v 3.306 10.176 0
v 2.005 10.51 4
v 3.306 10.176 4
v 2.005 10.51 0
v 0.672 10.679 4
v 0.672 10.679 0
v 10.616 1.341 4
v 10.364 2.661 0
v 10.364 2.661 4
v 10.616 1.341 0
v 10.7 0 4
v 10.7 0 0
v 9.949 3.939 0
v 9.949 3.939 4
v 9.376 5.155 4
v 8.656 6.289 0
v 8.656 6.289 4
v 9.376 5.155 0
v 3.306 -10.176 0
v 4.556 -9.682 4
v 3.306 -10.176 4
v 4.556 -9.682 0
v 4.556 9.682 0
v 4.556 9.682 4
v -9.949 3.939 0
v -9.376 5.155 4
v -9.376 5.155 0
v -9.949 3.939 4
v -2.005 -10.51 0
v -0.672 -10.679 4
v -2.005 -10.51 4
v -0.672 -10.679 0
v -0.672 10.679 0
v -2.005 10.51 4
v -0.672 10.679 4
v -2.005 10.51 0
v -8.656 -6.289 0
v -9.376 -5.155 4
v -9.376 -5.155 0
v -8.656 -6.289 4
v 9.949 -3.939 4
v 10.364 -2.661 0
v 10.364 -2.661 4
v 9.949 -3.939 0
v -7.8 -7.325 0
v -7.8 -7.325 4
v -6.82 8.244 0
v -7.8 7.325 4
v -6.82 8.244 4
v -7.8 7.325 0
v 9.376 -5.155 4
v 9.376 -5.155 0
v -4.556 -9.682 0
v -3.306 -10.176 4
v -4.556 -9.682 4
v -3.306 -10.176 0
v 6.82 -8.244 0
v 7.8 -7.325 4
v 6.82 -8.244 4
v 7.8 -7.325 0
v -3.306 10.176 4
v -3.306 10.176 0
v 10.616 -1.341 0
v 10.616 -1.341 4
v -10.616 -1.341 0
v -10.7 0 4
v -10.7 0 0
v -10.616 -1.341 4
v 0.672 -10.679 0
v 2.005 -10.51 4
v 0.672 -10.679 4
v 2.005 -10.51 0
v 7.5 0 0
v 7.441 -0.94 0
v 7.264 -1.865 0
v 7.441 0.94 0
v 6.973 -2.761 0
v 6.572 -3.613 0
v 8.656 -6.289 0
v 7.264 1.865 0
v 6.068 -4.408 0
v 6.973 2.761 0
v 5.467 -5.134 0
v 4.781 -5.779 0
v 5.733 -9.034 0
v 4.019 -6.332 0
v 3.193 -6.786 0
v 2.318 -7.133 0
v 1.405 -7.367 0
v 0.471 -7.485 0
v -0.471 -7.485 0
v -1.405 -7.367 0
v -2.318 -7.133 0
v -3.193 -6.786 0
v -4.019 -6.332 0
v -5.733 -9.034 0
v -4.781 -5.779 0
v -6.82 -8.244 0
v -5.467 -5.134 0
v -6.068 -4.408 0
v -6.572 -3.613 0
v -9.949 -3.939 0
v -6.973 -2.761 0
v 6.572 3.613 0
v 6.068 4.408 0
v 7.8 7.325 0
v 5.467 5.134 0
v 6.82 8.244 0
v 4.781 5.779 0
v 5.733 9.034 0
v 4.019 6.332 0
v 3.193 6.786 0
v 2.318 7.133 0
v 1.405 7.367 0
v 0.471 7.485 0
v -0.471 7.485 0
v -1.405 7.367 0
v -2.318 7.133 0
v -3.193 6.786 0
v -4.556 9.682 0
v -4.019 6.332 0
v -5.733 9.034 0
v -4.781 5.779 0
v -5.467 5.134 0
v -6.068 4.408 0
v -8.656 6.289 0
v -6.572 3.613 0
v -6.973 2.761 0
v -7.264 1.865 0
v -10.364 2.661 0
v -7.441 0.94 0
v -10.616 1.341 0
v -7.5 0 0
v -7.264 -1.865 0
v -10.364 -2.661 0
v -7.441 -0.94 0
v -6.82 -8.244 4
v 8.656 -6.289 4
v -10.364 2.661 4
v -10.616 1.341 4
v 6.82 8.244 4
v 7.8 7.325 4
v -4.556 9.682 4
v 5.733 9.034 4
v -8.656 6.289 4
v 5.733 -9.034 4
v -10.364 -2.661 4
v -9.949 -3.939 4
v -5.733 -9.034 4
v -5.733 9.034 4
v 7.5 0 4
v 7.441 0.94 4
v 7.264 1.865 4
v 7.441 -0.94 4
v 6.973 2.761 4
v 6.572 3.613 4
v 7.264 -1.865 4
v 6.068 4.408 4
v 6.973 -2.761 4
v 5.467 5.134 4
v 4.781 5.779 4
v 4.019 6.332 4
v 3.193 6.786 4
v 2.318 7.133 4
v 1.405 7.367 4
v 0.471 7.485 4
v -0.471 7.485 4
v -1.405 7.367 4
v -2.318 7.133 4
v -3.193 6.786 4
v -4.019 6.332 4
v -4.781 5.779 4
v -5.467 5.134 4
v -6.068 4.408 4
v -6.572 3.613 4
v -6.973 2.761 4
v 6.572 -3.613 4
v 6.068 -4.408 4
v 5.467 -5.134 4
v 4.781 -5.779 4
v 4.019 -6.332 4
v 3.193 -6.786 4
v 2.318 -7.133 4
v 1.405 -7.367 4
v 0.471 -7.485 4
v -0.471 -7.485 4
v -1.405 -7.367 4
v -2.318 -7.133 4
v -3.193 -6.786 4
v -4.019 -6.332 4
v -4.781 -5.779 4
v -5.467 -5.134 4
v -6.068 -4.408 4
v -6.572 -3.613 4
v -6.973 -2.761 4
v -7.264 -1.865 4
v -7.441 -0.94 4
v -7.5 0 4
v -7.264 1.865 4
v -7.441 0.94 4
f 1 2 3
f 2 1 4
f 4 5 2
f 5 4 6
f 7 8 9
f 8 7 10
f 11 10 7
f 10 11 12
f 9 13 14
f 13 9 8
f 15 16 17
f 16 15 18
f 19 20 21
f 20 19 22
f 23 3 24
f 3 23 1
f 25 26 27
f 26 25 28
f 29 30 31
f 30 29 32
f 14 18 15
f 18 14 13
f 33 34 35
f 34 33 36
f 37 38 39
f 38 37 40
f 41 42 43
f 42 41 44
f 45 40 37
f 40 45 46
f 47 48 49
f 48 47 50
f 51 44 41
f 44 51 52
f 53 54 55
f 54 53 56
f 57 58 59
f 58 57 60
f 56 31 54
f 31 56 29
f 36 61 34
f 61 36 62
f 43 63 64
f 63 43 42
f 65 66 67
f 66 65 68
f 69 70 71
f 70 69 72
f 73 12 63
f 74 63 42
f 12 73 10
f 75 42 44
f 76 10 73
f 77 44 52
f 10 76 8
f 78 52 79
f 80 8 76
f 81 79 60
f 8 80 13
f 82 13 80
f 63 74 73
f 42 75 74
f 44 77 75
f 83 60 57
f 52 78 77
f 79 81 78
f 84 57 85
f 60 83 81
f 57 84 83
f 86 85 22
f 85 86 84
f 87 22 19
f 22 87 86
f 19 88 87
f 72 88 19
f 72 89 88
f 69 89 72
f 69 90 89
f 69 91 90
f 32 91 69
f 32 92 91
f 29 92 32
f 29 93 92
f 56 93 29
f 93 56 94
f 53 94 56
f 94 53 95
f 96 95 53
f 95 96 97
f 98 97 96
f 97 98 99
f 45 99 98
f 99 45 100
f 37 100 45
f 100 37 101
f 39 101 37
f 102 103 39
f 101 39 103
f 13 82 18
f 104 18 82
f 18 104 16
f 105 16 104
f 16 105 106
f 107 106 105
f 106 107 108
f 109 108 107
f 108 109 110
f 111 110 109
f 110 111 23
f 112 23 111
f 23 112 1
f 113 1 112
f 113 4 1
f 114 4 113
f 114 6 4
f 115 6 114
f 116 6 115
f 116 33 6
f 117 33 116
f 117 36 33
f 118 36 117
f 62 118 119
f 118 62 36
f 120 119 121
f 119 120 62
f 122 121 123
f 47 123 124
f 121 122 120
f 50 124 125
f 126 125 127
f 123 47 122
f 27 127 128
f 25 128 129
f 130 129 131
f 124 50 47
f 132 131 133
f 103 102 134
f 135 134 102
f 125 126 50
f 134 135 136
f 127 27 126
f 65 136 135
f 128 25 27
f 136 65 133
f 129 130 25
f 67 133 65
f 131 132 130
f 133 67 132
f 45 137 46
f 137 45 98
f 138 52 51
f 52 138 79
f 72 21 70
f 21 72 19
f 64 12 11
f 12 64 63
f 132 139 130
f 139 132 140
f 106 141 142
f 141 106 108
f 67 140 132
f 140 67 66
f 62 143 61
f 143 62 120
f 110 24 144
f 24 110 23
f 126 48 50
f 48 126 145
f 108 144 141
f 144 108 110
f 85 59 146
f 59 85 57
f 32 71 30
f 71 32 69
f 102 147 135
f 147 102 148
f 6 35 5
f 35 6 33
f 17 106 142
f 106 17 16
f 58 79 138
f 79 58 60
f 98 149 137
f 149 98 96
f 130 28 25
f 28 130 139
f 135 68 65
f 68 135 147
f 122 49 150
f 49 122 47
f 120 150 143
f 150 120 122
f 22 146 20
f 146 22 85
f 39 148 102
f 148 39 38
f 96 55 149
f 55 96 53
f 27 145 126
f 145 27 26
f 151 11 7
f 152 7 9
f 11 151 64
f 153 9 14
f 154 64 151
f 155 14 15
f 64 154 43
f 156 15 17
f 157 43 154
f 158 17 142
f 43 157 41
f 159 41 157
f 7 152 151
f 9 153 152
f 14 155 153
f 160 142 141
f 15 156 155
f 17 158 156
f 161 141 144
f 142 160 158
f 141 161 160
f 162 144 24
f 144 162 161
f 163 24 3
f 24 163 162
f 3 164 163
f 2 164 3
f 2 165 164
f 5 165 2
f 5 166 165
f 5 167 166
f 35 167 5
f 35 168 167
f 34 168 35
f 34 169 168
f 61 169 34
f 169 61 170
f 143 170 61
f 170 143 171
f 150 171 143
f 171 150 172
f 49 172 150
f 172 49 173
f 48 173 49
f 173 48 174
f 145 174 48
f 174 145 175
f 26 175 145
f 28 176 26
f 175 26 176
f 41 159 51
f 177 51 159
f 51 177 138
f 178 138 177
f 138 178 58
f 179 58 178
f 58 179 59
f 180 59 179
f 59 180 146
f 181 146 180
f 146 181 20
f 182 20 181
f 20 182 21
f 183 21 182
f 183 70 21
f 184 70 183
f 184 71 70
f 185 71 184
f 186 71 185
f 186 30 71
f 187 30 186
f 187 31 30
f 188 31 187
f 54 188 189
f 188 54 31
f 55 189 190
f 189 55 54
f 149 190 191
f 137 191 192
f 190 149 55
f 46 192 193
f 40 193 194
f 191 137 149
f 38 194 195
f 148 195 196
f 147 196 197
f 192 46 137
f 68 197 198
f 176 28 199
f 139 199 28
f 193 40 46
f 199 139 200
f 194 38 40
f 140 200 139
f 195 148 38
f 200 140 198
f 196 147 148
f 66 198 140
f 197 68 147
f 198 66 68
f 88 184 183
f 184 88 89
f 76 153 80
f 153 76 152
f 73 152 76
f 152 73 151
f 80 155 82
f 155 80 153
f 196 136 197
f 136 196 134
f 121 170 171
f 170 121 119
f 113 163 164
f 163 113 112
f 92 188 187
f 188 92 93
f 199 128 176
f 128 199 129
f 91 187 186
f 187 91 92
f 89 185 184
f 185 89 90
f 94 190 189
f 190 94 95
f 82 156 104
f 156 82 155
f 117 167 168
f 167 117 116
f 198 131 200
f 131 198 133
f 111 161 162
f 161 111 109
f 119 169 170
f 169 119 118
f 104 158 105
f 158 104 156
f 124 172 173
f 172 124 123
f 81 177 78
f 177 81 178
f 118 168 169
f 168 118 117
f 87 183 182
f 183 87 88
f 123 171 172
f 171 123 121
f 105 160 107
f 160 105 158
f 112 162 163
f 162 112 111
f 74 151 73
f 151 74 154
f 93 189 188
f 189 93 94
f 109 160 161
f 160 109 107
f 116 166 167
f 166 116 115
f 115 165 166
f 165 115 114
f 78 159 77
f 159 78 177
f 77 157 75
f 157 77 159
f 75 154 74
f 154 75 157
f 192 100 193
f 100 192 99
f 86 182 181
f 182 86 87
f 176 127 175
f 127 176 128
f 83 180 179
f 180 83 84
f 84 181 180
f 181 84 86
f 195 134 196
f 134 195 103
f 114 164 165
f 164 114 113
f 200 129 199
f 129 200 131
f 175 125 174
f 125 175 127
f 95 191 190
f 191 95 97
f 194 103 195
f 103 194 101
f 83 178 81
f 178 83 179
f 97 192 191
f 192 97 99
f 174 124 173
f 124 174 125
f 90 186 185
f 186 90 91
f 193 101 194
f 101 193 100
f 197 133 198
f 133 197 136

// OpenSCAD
$fn = 50;


difference() {
	union() {
		cylinder(h = 4, r = 10.7000000000);
	}
	union() {
		cylinder(h = 4, r = 7.5000000000);
	}
}
